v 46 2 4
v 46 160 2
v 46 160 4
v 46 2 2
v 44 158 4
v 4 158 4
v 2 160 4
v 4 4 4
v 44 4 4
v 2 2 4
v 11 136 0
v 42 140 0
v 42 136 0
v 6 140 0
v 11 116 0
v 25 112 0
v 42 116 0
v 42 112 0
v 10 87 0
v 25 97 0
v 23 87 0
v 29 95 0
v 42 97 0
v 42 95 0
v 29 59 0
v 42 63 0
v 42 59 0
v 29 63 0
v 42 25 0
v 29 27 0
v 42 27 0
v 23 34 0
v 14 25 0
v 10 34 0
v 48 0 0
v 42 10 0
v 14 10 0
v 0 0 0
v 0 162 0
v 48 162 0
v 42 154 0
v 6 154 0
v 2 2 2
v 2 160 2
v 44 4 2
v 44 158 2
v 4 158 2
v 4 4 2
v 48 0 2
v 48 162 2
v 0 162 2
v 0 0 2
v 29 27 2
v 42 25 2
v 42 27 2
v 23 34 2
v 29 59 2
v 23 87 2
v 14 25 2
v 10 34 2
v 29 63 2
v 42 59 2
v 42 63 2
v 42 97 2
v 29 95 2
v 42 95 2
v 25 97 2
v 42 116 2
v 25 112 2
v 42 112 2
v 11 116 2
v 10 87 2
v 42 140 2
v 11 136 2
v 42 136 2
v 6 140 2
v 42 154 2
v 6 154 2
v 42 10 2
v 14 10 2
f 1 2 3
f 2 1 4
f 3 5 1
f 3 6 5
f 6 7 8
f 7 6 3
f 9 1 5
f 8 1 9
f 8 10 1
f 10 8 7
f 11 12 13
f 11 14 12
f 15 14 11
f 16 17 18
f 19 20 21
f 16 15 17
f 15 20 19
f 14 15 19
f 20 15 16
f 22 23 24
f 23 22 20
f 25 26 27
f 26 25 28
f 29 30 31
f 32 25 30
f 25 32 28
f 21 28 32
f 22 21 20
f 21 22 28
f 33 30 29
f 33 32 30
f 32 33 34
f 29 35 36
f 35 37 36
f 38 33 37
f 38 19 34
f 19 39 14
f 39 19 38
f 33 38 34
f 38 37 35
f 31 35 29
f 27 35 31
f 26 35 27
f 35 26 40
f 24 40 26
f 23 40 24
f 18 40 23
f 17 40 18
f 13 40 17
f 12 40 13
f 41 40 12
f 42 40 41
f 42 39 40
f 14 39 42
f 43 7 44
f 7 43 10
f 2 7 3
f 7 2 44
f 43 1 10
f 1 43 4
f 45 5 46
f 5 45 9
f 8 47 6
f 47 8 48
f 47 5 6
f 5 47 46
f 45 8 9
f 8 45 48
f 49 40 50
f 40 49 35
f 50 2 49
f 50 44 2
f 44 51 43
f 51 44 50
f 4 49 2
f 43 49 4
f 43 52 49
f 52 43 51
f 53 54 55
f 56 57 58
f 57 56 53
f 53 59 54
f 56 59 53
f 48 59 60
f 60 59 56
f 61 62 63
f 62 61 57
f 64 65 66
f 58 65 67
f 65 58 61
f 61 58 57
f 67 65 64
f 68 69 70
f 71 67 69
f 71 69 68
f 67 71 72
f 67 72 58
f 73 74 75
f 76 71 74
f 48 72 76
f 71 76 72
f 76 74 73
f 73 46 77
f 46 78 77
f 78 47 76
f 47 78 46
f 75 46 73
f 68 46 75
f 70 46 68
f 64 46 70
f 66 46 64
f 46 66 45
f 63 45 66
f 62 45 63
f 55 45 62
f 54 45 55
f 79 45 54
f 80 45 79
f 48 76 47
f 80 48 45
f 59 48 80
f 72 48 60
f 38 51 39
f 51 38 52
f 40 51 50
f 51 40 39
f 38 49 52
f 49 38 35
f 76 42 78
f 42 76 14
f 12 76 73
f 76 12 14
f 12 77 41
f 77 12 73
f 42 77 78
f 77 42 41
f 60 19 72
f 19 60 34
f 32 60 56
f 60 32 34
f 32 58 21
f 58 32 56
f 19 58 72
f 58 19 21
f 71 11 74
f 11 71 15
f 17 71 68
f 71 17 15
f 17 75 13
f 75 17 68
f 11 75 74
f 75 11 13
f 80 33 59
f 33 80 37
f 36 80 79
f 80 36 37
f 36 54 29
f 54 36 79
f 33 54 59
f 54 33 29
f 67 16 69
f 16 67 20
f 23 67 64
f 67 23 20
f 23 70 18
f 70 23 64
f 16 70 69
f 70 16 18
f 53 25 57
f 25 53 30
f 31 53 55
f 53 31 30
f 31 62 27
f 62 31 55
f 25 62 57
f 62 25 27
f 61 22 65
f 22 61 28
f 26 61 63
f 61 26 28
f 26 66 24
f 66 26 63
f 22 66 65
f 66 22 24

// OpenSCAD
module mobo_shield() {
	union() {
		cube([48,162,2]);
		difference() {
			translate([2,2,0]) cube([44,158,4]);
			translate([4,4,1]) cube([40,154,6]);
		}
	}
}

module mobo_shield_dxf() {
	difference() {
		mobo_shield();
		translate([46,2,-1]) rotate([0,0,90])
			linear_extrude(file = "GA-D525TUD.dxf", height = 50);
	}
}

mobo_shield_dxf();
